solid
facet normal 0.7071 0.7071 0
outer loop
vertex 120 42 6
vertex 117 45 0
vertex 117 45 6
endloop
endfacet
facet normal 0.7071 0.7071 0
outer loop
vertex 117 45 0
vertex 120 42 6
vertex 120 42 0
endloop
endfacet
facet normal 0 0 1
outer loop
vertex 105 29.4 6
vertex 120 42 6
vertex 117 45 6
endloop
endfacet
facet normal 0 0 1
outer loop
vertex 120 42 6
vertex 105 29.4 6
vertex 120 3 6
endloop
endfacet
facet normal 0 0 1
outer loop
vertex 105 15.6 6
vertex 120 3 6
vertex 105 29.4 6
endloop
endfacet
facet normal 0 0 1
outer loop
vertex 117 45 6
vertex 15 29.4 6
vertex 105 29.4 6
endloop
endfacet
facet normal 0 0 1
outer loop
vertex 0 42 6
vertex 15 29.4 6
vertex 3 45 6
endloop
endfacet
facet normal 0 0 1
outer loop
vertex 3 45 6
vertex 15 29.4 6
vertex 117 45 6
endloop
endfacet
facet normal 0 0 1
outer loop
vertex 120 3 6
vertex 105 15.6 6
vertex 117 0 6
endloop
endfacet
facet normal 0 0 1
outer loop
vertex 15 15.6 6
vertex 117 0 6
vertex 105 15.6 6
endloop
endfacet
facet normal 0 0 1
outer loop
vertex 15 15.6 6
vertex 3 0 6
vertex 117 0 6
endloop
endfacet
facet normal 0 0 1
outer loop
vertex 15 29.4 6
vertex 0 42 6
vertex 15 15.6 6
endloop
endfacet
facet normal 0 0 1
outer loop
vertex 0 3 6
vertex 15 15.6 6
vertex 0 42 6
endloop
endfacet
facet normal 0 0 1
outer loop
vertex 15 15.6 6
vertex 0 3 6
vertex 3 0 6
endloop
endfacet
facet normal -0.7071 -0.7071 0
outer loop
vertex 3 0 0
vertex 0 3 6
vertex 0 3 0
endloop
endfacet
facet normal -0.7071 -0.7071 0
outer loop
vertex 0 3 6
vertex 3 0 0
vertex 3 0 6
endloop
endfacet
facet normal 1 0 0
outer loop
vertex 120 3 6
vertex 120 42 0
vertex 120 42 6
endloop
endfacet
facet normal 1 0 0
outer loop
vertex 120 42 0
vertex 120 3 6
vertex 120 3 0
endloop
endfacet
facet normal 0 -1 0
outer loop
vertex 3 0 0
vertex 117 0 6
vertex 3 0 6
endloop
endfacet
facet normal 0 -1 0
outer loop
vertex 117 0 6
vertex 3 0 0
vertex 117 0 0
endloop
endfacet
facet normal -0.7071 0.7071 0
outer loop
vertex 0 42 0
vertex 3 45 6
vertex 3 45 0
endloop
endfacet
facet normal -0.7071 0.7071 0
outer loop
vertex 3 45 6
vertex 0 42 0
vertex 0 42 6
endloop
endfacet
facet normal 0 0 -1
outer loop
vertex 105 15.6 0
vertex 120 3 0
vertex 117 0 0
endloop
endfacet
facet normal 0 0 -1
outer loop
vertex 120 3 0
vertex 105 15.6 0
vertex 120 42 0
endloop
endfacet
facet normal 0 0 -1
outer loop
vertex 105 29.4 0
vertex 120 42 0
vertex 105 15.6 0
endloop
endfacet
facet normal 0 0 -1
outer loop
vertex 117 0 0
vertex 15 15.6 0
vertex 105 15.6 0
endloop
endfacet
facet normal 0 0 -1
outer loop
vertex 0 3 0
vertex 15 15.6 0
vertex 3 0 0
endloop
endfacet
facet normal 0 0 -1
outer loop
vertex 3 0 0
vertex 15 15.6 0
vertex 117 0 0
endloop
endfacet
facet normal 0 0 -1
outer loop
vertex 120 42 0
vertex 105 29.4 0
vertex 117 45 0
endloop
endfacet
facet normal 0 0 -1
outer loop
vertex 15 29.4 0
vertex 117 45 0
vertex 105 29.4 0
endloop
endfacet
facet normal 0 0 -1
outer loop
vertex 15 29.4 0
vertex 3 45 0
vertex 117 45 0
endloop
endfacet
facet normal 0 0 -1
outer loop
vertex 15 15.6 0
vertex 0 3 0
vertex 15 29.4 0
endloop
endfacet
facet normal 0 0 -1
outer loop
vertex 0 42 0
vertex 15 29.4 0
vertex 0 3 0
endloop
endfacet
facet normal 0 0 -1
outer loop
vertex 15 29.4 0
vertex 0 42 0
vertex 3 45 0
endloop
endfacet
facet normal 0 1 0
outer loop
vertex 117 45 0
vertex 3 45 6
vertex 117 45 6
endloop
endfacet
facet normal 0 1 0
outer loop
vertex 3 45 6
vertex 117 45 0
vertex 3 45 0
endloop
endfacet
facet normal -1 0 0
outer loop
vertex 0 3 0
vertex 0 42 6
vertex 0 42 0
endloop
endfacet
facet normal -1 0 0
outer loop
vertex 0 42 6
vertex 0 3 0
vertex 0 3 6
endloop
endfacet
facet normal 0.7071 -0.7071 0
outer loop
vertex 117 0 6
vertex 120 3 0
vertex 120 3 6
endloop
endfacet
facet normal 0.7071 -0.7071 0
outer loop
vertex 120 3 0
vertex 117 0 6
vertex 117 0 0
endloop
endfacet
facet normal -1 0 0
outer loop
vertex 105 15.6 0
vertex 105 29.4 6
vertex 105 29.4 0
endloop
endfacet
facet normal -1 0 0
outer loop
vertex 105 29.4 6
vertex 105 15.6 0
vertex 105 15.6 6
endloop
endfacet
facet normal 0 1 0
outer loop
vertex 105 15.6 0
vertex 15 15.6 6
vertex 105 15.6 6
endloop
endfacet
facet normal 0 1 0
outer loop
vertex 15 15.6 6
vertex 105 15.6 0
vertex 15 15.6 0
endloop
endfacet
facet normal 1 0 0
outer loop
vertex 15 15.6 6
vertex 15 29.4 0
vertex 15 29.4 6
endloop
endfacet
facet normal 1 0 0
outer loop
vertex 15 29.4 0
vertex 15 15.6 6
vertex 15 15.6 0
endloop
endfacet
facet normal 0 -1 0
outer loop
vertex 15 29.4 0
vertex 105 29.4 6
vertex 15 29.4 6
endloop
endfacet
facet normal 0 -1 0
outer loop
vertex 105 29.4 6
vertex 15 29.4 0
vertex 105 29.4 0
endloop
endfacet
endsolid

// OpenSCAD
$fn = 32;

// ----------------------------------------------------------------------
// Windowed plate: 1 voids, 120 x 45 x 6 mm
// ----------------------------------------------------------------------

// --- parameters (mm) ---
plate_l = 120;            // plate length, X
plate_w = 45;             // plate width, Y
plate_t = 6;              // plate thickness, Z
edge_margin = 10;         // wall from the plate edge to any window
win1_l = 90;              // window length
win1_w = 13.8;            // window width
depth_1 = 6;              // depth of void 1 (full thickness = through)
corner_c = 3;             // corner chamfer of the plate
fit_tol = 0.1;            // declared fit tolerance (prompt contract)
free_tol = 0.5;           // declared free tolerance (prompt contract)

profile = [[3, 0], [117, 0], [120, 3], [120, 42], [117, 45], [3, 45], [0, 42], [0, 3]];  // primary outline, 8 points, counter clockwise
void_1 = [[15, 15.6], [105, 15.6], [105, 29.4], [15, 29.4]];  // large central window, 4 points

// --- the one profile operation ---
difference() {
  linear_extrude(height = plate_t) polygon(points = profile);
  translate([0, 0, -1])
    linear_extrude(height = plate_t + 2) polygon(points = void_1);
}
